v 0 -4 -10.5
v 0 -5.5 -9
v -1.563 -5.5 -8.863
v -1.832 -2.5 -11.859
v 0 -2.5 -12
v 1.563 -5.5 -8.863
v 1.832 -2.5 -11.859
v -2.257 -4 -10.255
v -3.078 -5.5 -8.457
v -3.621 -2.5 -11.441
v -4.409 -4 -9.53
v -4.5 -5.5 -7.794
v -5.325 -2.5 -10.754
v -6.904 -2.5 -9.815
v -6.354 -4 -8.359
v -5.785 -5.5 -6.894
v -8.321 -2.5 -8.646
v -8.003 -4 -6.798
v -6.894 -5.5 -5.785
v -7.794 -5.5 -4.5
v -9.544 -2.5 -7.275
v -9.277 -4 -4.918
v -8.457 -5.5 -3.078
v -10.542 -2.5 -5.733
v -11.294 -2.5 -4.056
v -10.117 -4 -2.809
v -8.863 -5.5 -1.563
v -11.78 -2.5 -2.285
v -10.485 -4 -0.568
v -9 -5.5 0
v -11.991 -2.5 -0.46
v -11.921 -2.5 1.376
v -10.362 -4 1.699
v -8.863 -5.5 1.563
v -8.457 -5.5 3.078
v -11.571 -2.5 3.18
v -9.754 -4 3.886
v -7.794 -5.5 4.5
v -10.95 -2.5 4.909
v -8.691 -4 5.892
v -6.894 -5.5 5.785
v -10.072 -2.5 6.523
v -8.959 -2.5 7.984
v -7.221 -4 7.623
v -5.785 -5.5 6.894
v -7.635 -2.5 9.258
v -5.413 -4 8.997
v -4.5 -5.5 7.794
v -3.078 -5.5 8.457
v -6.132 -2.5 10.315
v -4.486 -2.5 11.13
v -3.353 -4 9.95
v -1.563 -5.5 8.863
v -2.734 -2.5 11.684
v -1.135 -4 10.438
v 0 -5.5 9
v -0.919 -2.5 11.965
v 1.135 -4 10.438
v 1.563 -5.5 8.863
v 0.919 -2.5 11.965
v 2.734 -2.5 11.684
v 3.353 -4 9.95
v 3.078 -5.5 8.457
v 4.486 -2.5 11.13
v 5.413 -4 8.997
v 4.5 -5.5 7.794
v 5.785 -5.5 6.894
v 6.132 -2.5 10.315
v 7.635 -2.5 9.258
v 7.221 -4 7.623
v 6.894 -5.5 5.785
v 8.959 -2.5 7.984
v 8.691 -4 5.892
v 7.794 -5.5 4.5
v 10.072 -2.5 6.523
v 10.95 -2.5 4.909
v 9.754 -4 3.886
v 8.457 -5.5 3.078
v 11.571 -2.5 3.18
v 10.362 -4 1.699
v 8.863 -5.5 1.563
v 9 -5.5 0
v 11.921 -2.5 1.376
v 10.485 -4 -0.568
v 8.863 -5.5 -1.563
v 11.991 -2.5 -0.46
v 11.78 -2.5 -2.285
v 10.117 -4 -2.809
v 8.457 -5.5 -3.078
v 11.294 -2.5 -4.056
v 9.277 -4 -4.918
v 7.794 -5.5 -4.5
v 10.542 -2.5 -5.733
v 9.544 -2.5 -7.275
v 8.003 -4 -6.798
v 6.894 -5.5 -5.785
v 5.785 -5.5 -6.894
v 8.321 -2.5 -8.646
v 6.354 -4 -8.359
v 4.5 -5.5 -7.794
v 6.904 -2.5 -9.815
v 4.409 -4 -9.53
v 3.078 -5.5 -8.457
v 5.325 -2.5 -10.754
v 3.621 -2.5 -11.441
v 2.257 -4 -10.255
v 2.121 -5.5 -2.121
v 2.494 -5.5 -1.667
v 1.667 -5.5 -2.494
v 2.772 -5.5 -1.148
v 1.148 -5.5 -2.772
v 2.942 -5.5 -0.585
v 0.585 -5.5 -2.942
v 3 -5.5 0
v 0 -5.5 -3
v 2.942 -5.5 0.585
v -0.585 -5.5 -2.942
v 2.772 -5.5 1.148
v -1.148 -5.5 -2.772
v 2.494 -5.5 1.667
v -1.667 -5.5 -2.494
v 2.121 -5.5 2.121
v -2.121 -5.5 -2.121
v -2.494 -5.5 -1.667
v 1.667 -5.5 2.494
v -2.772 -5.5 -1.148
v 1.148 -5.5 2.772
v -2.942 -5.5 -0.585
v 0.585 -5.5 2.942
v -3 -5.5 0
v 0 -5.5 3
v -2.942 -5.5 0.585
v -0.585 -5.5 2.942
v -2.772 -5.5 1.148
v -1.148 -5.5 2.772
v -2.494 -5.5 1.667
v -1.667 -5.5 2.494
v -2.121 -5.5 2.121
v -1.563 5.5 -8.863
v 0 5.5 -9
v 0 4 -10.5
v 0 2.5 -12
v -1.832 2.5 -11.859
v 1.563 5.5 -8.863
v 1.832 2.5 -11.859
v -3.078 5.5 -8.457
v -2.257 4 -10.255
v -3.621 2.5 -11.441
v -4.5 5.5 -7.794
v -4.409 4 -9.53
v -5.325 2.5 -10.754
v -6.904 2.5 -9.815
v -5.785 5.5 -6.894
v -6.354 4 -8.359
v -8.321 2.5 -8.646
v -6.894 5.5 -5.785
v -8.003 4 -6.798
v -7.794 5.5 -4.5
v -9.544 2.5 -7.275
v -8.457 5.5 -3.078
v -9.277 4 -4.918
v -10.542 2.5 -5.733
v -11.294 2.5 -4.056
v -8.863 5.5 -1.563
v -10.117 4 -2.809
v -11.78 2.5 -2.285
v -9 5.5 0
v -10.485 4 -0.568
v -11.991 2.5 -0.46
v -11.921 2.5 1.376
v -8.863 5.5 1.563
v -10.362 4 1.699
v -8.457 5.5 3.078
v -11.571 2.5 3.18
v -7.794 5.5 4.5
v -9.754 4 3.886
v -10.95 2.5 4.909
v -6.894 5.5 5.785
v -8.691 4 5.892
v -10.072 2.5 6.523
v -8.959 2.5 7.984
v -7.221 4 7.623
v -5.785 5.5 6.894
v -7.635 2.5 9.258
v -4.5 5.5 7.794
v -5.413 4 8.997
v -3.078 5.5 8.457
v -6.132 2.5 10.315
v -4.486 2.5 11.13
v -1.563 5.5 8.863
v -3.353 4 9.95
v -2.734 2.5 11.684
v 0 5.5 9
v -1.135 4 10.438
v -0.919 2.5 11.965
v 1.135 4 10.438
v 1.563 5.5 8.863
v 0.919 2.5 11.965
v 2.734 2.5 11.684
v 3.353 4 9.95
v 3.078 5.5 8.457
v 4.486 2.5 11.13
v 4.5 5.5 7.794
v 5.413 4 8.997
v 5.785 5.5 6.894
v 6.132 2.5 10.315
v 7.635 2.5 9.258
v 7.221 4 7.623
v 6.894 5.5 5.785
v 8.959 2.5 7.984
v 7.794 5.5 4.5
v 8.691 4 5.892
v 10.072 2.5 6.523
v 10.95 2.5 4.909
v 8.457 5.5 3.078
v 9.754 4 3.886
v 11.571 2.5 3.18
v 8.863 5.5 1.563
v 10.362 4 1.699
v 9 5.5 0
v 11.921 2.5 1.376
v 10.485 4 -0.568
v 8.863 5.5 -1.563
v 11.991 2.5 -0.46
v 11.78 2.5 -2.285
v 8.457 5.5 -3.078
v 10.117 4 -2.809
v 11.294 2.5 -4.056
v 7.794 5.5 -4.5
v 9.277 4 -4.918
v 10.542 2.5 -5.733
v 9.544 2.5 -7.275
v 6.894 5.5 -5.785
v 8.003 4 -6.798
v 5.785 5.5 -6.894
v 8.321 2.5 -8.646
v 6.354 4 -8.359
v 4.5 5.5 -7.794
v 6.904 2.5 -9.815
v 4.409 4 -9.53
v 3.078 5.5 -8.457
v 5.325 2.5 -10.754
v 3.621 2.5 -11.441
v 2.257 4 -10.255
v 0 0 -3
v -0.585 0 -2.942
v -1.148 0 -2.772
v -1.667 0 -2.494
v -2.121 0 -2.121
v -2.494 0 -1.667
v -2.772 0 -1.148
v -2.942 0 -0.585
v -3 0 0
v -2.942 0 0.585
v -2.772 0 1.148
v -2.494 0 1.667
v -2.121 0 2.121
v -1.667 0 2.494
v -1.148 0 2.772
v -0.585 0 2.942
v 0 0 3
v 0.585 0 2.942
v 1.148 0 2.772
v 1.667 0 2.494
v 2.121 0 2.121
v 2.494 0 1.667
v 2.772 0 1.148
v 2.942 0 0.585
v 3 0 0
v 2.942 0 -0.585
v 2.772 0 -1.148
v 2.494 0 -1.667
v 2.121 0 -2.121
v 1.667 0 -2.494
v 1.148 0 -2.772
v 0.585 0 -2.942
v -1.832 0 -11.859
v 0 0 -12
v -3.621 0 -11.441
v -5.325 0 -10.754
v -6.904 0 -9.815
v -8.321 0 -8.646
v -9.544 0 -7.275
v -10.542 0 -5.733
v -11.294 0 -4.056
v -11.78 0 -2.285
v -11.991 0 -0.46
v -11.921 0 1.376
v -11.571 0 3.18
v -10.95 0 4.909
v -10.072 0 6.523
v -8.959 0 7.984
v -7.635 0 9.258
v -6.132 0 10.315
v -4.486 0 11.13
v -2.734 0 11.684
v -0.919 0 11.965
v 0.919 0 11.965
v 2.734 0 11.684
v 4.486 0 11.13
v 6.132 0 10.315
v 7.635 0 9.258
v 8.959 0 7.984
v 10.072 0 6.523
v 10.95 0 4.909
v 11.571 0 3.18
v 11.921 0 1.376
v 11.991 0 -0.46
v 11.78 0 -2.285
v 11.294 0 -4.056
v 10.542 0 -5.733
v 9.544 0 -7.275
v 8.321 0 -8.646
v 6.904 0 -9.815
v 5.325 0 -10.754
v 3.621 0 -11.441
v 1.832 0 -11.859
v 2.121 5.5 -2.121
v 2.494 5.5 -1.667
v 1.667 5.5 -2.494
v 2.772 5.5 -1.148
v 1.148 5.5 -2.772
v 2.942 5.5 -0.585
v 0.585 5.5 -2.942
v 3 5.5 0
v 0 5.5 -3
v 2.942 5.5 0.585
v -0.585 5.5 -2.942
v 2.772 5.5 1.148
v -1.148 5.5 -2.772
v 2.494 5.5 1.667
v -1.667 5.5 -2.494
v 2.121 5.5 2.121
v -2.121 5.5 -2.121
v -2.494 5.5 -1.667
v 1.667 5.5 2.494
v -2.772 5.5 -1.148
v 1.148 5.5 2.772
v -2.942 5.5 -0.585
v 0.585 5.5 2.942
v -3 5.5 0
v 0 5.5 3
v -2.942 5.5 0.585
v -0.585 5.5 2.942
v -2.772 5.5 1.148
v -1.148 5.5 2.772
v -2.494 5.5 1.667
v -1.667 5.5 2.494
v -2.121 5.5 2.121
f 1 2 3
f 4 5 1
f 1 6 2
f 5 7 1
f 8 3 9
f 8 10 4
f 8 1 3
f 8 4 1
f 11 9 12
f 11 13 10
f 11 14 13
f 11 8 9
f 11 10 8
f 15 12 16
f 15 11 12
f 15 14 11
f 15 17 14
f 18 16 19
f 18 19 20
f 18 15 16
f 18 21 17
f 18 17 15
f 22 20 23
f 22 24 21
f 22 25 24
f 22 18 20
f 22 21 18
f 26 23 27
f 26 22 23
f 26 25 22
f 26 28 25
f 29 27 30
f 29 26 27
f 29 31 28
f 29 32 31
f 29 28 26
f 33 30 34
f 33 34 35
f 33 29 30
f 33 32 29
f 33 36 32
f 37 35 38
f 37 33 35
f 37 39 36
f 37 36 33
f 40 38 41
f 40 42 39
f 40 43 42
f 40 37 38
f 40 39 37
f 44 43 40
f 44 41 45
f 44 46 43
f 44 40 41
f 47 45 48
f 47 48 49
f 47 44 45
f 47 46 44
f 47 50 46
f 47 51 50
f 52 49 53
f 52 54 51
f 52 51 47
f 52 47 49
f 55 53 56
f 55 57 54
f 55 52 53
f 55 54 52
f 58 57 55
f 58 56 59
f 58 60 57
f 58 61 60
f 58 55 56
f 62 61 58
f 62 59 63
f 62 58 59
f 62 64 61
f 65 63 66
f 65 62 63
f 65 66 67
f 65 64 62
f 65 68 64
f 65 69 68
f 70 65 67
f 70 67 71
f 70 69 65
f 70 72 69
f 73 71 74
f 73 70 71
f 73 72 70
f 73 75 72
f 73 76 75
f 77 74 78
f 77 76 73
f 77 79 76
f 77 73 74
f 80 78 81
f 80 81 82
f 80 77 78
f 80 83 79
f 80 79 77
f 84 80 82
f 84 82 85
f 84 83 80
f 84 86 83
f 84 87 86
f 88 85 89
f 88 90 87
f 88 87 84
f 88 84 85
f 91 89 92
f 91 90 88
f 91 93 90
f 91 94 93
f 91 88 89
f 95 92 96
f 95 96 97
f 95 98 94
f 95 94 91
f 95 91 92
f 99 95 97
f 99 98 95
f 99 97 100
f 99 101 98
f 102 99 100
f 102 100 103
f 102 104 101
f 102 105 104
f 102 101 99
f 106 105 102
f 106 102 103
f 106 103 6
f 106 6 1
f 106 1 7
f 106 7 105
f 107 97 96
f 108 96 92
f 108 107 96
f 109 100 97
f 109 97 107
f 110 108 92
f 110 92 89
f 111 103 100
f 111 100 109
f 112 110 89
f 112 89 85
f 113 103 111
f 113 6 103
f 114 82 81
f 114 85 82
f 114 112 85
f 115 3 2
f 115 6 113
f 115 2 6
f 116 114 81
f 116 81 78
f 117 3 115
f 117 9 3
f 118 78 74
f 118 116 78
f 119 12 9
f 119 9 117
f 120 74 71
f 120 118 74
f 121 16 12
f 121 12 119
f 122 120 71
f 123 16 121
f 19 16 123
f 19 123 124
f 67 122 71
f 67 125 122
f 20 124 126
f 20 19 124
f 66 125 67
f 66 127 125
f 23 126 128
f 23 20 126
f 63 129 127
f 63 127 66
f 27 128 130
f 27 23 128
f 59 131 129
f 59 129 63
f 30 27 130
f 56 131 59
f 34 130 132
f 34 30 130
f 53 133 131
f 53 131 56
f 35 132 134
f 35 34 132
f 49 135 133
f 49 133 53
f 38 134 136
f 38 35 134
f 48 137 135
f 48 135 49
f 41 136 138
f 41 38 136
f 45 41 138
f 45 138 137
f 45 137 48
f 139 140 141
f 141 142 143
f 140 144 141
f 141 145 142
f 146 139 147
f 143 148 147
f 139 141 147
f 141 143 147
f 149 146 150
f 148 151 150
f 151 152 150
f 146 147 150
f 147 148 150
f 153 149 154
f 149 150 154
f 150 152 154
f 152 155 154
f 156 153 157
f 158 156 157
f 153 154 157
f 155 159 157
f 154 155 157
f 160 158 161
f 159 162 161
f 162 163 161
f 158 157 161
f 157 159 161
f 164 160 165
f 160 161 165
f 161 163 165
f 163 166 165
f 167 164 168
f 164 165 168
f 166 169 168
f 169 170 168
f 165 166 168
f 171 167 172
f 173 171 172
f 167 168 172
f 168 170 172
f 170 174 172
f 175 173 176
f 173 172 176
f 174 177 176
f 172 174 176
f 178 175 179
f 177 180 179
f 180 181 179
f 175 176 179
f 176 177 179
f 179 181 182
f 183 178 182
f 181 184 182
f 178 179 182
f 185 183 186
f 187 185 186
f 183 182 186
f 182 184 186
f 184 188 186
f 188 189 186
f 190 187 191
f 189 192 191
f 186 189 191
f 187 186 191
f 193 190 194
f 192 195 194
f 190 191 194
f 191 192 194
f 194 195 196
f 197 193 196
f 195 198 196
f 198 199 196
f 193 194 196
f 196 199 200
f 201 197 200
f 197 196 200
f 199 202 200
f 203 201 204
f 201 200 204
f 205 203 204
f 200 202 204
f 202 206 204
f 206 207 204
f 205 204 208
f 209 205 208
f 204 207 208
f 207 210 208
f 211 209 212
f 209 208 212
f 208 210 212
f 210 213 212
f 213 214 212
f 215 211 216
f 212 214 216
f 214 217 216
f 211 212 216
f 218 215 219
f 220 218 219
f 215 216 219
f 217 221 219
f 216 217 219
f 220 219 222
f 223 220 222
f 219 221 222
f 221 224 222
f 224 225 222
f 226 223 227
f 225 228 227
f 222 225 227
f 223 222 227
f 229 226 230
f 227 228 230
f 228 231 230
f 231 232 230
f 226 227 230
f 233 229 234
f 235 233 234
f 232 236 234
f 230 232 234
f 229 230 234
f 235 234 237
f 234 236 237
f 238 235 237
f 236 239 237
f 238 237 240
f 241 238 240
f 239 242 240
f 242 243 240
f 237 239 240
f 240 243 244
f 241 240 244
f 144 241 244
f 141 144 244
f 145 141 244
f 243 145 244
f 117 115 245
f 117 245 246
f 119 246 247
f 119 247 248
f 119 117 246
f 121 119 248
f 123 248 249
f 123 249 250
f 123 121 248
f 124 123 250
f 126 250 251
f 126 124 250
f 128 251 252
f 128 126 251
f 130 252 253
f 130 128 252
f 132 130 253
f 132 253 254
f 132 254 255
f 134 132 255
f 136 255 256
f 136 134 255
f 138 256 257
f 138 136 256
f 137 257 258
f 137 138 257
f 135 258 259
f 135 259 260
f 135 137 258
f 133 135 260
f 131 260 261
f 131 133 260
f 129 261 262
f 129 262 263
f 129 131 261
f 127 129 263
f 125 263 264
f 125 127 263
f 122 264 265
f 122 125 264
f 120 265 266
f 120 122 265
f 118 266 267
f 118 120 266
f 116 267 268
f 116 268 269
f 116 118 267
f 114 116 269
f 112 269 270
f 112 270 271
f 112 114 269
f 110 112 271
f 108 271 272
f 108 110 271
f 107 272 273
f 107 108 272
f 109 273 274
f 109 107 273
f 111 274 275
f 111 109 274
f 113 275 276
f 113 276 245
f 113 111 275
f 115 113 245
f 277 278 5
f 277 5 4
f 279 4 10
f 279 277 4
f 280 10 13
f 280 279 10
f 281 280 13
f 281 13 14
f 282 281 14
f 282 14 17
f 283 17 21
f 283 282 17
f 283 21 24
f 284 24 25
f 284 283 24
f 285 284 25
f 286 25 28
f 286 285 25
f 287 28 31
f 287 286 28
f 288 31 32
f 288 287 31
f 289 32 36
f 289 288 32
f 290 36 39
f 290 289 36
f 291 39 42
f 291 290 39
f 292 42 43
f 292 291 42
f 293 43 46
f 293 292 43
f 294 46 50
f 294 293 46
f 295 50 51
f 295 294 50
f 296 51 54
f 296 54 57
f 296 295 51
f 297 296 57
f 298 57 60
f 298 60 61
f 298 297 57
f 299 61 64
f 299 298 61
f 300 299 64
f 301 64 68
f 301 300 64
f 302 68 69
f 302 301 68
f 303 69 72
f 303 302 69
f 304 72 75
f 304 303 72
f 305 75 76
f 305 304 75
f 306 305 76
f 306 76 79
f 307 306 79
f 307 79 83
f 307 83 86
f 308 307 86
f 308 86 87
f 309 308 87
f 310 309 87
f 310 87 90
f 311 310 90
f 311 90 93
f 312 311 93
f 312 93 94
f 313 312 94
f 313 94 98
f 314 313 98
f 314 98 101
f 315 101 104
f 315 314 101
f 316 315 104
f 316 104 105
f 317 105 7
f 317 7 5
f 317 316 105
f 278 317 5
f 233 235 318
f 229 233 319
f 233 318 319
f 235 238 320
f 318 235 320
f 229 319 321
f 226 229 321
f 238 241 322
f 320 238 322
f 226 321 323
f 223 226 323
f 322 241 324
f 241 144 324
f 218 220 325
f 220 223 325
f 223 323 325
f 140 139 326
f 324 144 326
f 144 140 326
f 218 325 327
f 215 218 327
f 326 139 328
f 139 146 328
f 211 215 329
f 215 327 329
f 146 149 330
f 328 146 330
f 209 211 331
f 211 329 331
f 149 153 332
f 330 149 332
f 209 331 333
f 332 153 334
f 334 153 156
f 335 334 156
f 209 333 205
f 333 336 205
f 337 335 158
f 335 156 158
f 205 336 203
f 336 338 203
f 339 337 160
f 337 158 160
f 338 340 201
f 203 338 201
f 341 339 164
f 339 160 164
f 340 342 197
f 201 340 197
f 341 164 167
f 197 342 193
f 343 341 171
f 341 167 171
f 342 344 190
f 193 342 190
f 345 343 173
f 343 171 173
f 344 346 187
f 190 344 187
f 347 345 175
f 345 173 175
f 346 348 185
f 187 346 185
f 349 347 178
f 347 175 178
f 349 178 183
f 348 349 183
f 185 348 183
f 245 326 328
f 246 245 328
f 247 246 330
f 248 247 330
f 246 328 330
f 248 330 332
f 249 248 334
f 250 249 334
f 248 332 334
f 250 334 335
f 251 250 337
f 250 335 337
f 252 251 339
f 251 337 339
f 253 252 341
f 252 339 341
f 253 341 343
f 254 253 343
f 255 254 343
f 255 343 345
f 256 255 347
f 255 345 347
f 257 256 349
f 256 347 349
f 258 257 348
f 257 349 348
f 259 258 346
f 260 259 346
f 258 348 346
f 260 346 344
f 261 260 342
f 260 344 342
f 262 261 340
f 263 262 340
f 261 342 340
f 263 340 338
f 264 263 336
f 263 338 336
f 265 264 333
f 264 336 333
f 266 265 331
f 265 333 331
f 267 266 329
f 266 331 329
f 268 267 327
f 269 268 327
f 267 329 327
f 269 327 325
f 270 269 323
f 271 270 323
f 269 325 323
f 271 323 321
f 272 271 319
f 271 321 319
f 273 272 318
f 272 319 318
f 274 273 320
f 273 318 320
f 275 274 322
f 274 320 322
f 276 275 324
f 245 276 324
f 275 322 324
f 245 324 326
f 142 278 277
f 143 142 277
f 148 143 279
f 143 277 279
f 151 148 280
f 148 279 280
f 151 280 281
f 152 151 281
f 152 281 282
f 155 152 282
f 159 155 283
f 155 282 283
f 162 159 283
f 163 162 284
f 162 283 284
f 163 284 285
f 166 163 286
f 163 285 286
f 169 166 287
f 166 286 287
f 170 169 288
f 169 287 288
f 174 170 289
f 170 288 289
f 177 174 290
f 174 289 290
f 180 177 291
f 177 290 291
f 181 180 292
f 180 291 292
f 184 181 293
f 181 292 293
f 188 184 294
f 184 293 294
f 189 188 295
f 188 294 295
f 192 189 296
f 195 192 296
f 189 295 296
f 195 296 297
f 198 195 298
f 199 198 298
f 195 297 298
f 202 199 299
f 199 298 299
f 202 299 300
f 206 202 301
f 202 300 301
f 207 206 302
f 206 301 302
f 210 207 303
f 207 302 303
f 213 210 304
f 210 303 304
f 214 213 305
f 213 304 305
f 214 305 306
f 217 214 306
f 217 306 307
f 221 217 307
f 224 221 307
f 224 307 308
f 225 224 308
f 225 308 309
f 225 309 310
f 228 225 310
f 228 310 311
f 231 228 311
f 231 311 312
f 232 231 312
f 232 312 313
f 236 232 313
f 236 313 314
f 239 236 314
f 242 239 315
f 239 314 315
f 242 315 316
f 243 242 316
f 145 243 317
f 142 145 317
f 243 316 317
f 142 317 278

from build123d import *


with BuildPart() as part:
    # Эскиз1 → Повернуть1 (revolve)
    with BuildSketch(Plane(origin=(0, 0, 0), x_dir=(0, 0, -1), z_dir=(1, 0, 0))):
        Polygon((3, 5.5), (9, 5.5), (12, 2.5), (12, 0), (3, 0), align=None)
    revolve_1 = revolve(axis=Axis((0, 0, 0), (0, 1, 0)))

    # Зеркальное отражение1: Повернуть1 across plane
    add(revolve_1.mirror(Plane.ZX))


solid = part.part
